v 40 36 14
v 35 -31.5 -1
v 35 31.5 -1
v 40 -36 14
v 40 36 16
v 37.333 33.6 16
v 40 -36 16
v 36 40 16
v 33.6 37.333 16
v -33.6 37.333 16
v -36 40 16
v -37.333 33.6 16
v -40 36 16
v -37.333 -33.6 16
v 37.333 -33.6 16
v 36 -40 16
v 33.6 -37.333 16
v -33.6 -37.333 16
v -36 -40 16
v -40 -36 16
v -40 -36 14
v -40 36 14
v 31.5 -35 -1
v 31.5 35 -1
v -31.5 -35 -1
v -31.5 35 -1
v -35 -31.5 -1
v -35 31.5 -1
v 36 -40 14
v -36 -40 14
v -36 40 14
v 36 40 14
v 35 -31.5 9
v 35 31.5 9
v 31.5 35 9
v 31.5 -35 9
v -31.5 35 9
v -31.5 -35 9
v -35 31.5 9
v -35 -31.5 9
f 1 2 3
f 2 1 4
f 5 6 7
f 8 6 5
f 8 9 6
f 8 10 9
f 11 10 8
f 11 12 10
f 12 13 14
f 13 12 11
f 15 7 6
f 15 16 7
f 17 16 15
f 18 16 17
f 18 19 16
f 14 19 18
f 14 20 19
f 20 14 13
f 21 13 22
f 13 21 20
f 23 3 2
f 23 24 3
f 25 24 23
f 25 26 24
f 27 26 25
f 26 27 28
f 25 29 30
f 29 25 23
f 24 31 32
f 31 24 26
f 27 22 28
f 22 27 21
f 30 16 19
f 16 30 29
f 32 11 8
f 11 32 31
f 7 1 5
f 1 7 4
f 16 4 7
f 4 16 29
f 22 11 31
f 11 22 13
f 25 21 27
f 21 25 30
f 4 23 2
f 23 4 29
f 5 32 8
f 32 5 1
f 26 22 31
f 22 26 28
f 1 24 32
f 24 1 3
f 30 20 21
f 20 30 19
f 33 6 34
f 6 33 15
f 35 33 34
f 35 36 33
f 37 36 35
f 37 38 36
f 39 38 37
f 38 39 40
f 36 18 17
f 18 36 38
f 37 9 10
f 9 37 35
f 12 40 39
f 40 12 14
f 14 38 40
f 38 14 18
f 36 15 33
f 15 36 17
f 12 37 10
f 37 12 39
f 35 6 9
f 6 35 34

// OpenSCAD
// All except two of the feet are roughly 50x50mm
// The two outliers have a width of ~70x60mm

innerbottom = 70;
outer_top = 80;
outer_bottom = 70;
wall = (outer_bottom - innerbottom)/2;
t = (outer_top - outer_bottom)/2;
ledgeheight = 5;
raiseheight = 10;
totalheight = ledgeheight + raiseheight;

module roundcube() {
    union() {
        for(i = [1:4]) {
            sphere(10);
        }
    }
}

module main() {
    difference() {
        hull() {
            translate([0, 0, totalheight]) cube([outer_top, outer_top, 2], center=true);
            cube([outer_bottom, outer_bottom, 2], center=true);
        }
        //translate([wall, wall, 50/2 + raiseheight])
        //    cube([innerbottom, innerbottom, 50], center=true);
    }
}

module mainbevel() {
    intersection() {
        main();
        scale([sqrt(2)*0.95, sqrt(2)*0.95, 1])
        rotate([0, 0, 45])
            hull () {
                main();
            };
    }
}

difference () {
    mainbevel();
    translate([wall, wall, raiseheight])
        mainbevel();
}
